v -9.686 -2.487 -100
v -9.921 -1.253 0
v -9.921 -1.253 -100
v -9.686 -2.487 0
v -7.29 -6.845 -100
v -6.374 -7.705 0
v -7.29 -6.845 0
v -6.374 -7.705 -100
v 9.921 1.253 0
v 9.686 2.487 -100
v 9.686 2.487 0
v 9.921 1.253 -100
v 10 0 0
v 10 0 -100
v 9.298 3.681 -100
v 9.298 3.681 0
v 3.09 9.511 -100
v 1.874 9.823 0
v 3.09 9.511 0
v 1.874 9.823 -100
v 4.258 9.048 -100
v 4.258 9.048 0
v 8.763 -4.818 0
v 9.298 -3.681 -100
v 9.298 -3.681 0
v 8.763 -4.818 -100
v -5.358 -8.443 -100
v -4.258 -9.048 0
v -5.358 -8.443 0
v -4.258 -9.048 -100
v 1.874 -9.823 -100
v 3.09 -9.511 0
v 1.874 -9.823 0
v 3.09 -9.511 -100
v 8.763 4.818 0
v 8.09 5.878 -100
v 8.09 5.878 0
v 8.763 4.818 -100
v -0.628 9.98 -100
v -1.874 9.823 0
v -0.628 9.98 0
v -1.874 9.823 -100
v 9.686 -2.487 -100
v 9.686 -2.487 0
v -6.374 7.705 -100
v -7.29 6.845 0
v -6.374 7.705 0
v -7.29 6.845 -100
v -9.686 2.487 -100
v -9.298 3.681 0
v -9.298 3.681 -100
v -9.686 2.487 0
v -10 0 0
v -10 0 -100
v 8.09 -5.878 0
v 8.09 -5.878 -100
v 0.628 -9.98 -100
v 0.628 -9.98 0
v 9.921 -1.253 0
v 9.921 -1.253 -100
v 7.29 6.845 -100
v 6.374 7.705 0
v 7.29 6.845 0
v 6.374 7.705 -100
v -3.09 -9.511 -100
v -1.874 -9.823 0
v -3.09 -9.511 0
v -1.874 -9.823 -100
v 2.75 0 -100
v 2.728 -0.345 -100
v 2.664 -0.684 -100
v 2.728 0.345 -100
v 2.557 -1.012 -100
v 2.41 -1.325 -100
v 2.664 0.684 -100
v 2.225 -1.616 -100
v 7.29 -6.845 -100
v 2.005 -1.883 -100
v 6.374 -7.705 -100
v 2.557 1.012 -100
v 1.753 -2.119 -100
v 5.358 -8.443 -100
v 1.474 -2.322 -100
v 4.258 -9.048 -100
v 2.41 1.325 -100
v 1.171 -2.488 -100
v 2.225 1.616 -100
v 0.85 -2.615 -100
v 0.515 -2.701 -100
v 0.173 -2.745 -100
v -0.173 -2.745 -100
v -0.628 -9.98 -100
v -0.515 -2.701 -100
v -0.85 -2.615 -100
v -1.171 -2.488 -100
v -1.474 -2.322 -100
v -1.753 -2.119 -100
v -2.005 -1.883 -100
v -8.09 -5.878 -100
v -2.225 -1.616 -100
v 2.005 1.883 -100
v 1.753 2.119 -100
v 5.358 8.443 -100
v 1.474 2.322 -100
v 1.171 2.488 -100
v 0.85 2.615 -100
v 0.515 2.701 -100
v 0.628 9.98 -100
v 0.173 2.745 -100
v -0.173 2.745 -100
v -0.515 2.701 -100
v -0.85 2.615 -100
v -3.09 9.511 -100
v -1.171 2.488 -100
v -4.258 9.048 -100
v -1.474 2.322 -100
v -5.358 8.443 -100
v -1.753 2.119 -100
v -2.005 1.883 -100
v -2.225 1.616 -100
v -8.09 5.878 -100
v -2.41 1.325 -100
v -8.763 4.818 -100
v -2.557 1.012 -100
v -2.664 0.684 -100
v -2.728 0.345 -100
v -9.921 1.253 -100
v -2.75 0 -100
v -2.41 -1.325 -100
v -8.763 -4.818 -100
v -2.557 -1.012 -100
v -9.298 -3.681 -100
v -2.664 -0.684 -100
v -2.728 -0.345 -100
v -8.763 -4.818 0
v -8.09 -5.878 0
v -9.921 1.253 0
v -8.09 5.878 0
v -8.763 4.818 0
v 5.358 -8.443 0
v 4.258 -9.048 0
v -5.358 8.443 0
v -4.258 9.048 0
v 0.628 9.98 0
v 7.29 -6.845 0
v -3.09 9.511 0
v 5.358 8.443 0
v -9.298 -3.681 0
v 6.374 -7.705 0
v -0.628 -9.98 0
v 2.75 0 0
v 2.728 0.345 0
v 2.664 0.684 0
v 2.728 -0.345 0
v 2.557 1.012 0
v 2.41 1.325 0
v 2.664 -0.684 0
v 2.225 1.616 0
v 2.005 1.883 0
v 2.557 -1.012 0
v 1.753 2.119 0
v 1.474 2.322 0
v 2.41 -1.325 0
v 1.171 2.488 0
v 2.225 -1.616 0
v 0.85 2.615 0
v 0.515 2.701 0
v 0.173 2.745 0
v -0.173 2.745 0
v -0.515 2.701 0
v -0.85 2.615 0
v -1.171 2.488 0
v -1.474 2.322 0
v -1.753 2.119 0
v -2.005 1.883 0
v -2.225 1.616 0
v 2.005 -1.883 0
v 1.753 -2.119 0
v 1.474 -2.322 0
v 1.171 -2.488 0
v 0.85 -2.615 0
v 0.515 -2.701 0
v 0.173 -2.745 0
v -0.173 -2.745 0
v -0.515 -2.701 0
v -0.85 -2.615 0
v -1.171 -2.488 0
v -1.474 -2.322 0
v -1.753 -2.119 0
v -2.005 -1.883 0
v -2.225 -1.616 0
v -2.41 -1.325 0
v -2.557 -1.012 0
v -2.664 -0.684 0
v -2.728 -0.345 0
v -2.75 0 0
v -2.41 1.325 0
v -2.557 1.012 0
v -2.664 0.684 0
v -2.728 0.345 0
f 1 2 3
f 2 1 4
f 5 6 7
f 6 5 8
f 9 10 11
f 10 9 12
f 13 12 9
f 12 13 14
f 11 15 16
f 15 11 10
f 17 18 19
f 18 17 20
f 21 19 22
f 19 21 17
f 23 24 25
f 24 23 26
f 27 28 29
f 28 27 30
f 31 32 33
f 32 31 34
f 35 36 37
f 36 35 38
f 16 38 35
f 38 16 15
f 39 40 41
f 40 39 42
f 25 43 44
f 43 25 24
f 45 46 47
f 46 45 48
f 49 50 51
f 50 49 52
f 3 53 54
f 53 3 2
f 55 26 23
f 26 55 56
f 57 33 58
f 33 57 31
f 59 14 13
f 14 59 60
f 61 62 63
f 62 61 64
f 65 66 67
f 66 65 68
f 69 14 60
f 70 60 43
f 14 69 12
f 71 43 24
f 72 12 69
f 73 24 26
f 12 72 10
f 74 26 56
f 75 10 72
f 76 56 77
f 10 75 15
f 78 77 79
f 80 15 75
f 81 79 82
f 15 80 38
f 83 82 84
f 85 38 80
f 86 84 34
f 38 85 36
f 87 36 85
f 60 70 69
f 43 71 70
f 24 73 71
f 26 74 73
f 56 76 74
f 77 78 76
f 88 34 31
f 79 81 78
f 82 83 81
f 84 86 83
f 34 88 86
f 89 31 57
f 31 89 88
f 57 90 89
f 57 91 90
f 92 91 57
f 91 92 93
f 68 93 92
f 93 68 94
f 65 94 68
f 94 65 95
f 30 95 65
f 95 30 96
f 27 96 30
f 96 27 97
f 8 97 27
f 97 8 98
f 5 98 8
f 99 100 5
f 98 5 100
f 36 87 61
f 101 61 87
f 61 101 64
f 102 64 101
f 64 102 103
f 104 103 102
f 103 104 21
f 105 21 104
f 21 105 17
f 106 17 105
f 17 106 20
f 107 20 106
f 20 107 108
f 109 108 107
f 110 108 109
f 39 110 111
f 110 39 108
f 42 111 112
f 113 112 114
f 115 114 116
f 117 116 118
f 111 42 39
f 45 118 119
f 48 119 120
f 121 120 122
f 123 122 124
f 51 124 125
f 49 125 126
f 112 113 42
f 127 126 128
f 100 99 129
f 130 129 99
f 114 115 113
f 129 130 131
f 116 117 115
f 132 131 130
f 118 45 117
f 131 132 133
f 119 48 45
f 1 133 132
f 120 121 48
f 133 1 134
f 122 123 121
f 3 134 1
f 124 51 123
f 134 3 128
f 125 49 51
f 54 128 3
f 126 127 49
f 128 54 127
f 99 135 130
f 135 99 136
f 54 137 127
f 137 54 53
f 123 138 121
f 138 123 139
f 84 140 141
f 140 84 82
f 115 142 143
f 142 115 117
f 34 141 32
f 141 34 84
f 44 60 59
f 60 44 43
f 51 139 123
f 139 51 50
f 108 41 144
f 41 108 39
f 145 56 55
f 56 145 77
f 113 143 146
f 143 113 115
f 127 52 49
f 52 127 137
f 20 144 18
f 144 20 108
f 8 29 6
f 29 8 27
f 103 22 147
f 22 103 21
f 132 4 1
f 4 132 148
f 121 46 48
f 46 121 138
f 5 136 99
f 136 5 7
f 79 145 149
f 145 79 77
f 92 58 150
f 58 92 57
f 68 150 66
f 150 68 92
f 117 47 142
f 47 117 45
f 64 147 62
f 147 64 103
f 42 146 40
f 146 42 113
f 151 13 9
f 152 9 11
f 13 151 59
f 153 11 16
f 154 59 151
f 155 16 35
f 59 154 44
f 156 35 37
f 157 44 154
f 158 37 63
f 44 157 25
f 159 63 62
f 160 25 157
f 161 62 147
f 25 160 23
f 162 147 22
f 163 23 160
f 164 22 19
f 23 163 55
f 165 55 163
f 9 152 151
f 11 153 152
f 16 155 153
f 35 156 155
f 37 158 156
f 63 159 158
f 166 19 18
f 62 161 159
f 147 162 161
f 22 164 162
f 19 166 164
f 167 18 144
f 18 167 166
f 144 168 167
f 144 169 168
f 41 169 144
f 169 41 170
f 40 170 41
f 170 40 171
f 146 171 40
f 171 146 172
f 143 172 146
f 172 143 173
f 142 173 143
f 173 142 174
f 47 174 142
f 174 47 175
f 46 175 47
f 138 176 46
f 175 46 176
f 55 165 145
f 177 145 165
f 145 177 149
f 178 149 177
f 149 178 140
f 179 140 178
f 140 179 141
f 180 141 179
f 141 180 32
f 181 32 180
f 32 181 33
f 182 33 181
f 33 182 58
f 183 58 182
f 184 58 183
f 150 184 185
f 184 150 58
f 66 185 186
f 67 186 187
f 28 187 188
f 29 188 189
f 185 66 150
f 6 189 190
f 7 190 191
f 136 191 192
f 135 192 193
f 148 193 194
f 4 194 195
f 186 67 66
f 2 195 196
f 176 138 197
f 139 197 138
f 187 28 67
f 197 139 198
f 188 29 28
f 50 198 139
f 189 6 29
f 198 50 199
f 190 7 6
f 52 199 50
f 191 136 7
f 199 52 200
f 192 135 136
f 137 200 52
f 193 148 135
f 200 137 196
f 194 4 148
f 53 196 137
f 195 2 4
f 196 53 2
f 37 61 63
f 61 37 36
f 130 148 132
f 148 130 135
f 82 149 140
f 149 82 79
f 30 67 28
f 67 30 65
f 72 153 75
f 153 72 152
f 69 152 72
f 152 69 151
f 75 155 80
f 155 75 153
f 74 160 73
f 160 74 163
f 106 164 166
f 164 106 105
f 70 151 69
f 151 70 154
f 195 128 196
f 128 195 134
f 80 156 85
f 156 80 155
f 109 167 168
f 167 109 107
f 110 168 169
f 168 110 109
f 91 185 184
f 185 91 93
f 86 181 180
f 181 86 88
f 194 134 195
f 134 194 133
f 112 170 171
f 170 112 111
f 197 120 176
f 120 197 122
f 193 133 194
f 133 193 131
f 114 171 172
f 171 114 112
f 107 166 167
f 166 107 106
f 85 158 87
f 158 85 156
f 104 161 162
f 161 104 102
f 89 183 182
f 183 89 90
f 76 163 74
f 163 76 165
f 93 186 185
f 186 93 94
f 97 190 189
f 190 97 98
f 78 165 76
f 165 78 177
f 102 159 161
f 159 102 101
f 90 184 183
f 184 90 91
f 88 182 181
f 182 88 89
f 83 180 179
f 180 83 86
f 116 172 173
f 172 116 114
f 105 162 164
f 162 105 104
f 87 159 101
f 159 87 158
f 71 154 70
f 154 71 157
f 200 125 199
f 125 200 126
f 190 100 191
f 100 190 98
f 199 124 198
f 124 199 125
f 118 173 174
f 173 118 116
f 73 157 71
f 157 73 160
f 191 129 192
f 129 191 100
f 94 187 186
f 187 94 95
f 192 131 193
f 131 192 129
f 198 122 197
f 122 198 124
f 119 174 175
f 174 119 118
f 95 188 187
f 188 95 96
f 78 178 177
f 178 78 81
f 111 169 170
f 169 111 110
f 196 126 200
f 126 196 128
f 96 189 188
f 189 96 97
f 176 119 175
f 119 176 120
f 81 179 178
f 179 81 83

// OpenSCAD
$fn = 50;


difference() {
	union() {
		translate(v = [0, 0, -100.0000000000]) {
			cylinder(h = 100, r = 10.0000000000);
		}
		cylinder(h = 0, r = 19.0000000000);
	}
	union() {
		#translate(v = [0, 0, -100]) {
			cylinder(h = 100, r = 2.7500000000);
		}
	}
}
